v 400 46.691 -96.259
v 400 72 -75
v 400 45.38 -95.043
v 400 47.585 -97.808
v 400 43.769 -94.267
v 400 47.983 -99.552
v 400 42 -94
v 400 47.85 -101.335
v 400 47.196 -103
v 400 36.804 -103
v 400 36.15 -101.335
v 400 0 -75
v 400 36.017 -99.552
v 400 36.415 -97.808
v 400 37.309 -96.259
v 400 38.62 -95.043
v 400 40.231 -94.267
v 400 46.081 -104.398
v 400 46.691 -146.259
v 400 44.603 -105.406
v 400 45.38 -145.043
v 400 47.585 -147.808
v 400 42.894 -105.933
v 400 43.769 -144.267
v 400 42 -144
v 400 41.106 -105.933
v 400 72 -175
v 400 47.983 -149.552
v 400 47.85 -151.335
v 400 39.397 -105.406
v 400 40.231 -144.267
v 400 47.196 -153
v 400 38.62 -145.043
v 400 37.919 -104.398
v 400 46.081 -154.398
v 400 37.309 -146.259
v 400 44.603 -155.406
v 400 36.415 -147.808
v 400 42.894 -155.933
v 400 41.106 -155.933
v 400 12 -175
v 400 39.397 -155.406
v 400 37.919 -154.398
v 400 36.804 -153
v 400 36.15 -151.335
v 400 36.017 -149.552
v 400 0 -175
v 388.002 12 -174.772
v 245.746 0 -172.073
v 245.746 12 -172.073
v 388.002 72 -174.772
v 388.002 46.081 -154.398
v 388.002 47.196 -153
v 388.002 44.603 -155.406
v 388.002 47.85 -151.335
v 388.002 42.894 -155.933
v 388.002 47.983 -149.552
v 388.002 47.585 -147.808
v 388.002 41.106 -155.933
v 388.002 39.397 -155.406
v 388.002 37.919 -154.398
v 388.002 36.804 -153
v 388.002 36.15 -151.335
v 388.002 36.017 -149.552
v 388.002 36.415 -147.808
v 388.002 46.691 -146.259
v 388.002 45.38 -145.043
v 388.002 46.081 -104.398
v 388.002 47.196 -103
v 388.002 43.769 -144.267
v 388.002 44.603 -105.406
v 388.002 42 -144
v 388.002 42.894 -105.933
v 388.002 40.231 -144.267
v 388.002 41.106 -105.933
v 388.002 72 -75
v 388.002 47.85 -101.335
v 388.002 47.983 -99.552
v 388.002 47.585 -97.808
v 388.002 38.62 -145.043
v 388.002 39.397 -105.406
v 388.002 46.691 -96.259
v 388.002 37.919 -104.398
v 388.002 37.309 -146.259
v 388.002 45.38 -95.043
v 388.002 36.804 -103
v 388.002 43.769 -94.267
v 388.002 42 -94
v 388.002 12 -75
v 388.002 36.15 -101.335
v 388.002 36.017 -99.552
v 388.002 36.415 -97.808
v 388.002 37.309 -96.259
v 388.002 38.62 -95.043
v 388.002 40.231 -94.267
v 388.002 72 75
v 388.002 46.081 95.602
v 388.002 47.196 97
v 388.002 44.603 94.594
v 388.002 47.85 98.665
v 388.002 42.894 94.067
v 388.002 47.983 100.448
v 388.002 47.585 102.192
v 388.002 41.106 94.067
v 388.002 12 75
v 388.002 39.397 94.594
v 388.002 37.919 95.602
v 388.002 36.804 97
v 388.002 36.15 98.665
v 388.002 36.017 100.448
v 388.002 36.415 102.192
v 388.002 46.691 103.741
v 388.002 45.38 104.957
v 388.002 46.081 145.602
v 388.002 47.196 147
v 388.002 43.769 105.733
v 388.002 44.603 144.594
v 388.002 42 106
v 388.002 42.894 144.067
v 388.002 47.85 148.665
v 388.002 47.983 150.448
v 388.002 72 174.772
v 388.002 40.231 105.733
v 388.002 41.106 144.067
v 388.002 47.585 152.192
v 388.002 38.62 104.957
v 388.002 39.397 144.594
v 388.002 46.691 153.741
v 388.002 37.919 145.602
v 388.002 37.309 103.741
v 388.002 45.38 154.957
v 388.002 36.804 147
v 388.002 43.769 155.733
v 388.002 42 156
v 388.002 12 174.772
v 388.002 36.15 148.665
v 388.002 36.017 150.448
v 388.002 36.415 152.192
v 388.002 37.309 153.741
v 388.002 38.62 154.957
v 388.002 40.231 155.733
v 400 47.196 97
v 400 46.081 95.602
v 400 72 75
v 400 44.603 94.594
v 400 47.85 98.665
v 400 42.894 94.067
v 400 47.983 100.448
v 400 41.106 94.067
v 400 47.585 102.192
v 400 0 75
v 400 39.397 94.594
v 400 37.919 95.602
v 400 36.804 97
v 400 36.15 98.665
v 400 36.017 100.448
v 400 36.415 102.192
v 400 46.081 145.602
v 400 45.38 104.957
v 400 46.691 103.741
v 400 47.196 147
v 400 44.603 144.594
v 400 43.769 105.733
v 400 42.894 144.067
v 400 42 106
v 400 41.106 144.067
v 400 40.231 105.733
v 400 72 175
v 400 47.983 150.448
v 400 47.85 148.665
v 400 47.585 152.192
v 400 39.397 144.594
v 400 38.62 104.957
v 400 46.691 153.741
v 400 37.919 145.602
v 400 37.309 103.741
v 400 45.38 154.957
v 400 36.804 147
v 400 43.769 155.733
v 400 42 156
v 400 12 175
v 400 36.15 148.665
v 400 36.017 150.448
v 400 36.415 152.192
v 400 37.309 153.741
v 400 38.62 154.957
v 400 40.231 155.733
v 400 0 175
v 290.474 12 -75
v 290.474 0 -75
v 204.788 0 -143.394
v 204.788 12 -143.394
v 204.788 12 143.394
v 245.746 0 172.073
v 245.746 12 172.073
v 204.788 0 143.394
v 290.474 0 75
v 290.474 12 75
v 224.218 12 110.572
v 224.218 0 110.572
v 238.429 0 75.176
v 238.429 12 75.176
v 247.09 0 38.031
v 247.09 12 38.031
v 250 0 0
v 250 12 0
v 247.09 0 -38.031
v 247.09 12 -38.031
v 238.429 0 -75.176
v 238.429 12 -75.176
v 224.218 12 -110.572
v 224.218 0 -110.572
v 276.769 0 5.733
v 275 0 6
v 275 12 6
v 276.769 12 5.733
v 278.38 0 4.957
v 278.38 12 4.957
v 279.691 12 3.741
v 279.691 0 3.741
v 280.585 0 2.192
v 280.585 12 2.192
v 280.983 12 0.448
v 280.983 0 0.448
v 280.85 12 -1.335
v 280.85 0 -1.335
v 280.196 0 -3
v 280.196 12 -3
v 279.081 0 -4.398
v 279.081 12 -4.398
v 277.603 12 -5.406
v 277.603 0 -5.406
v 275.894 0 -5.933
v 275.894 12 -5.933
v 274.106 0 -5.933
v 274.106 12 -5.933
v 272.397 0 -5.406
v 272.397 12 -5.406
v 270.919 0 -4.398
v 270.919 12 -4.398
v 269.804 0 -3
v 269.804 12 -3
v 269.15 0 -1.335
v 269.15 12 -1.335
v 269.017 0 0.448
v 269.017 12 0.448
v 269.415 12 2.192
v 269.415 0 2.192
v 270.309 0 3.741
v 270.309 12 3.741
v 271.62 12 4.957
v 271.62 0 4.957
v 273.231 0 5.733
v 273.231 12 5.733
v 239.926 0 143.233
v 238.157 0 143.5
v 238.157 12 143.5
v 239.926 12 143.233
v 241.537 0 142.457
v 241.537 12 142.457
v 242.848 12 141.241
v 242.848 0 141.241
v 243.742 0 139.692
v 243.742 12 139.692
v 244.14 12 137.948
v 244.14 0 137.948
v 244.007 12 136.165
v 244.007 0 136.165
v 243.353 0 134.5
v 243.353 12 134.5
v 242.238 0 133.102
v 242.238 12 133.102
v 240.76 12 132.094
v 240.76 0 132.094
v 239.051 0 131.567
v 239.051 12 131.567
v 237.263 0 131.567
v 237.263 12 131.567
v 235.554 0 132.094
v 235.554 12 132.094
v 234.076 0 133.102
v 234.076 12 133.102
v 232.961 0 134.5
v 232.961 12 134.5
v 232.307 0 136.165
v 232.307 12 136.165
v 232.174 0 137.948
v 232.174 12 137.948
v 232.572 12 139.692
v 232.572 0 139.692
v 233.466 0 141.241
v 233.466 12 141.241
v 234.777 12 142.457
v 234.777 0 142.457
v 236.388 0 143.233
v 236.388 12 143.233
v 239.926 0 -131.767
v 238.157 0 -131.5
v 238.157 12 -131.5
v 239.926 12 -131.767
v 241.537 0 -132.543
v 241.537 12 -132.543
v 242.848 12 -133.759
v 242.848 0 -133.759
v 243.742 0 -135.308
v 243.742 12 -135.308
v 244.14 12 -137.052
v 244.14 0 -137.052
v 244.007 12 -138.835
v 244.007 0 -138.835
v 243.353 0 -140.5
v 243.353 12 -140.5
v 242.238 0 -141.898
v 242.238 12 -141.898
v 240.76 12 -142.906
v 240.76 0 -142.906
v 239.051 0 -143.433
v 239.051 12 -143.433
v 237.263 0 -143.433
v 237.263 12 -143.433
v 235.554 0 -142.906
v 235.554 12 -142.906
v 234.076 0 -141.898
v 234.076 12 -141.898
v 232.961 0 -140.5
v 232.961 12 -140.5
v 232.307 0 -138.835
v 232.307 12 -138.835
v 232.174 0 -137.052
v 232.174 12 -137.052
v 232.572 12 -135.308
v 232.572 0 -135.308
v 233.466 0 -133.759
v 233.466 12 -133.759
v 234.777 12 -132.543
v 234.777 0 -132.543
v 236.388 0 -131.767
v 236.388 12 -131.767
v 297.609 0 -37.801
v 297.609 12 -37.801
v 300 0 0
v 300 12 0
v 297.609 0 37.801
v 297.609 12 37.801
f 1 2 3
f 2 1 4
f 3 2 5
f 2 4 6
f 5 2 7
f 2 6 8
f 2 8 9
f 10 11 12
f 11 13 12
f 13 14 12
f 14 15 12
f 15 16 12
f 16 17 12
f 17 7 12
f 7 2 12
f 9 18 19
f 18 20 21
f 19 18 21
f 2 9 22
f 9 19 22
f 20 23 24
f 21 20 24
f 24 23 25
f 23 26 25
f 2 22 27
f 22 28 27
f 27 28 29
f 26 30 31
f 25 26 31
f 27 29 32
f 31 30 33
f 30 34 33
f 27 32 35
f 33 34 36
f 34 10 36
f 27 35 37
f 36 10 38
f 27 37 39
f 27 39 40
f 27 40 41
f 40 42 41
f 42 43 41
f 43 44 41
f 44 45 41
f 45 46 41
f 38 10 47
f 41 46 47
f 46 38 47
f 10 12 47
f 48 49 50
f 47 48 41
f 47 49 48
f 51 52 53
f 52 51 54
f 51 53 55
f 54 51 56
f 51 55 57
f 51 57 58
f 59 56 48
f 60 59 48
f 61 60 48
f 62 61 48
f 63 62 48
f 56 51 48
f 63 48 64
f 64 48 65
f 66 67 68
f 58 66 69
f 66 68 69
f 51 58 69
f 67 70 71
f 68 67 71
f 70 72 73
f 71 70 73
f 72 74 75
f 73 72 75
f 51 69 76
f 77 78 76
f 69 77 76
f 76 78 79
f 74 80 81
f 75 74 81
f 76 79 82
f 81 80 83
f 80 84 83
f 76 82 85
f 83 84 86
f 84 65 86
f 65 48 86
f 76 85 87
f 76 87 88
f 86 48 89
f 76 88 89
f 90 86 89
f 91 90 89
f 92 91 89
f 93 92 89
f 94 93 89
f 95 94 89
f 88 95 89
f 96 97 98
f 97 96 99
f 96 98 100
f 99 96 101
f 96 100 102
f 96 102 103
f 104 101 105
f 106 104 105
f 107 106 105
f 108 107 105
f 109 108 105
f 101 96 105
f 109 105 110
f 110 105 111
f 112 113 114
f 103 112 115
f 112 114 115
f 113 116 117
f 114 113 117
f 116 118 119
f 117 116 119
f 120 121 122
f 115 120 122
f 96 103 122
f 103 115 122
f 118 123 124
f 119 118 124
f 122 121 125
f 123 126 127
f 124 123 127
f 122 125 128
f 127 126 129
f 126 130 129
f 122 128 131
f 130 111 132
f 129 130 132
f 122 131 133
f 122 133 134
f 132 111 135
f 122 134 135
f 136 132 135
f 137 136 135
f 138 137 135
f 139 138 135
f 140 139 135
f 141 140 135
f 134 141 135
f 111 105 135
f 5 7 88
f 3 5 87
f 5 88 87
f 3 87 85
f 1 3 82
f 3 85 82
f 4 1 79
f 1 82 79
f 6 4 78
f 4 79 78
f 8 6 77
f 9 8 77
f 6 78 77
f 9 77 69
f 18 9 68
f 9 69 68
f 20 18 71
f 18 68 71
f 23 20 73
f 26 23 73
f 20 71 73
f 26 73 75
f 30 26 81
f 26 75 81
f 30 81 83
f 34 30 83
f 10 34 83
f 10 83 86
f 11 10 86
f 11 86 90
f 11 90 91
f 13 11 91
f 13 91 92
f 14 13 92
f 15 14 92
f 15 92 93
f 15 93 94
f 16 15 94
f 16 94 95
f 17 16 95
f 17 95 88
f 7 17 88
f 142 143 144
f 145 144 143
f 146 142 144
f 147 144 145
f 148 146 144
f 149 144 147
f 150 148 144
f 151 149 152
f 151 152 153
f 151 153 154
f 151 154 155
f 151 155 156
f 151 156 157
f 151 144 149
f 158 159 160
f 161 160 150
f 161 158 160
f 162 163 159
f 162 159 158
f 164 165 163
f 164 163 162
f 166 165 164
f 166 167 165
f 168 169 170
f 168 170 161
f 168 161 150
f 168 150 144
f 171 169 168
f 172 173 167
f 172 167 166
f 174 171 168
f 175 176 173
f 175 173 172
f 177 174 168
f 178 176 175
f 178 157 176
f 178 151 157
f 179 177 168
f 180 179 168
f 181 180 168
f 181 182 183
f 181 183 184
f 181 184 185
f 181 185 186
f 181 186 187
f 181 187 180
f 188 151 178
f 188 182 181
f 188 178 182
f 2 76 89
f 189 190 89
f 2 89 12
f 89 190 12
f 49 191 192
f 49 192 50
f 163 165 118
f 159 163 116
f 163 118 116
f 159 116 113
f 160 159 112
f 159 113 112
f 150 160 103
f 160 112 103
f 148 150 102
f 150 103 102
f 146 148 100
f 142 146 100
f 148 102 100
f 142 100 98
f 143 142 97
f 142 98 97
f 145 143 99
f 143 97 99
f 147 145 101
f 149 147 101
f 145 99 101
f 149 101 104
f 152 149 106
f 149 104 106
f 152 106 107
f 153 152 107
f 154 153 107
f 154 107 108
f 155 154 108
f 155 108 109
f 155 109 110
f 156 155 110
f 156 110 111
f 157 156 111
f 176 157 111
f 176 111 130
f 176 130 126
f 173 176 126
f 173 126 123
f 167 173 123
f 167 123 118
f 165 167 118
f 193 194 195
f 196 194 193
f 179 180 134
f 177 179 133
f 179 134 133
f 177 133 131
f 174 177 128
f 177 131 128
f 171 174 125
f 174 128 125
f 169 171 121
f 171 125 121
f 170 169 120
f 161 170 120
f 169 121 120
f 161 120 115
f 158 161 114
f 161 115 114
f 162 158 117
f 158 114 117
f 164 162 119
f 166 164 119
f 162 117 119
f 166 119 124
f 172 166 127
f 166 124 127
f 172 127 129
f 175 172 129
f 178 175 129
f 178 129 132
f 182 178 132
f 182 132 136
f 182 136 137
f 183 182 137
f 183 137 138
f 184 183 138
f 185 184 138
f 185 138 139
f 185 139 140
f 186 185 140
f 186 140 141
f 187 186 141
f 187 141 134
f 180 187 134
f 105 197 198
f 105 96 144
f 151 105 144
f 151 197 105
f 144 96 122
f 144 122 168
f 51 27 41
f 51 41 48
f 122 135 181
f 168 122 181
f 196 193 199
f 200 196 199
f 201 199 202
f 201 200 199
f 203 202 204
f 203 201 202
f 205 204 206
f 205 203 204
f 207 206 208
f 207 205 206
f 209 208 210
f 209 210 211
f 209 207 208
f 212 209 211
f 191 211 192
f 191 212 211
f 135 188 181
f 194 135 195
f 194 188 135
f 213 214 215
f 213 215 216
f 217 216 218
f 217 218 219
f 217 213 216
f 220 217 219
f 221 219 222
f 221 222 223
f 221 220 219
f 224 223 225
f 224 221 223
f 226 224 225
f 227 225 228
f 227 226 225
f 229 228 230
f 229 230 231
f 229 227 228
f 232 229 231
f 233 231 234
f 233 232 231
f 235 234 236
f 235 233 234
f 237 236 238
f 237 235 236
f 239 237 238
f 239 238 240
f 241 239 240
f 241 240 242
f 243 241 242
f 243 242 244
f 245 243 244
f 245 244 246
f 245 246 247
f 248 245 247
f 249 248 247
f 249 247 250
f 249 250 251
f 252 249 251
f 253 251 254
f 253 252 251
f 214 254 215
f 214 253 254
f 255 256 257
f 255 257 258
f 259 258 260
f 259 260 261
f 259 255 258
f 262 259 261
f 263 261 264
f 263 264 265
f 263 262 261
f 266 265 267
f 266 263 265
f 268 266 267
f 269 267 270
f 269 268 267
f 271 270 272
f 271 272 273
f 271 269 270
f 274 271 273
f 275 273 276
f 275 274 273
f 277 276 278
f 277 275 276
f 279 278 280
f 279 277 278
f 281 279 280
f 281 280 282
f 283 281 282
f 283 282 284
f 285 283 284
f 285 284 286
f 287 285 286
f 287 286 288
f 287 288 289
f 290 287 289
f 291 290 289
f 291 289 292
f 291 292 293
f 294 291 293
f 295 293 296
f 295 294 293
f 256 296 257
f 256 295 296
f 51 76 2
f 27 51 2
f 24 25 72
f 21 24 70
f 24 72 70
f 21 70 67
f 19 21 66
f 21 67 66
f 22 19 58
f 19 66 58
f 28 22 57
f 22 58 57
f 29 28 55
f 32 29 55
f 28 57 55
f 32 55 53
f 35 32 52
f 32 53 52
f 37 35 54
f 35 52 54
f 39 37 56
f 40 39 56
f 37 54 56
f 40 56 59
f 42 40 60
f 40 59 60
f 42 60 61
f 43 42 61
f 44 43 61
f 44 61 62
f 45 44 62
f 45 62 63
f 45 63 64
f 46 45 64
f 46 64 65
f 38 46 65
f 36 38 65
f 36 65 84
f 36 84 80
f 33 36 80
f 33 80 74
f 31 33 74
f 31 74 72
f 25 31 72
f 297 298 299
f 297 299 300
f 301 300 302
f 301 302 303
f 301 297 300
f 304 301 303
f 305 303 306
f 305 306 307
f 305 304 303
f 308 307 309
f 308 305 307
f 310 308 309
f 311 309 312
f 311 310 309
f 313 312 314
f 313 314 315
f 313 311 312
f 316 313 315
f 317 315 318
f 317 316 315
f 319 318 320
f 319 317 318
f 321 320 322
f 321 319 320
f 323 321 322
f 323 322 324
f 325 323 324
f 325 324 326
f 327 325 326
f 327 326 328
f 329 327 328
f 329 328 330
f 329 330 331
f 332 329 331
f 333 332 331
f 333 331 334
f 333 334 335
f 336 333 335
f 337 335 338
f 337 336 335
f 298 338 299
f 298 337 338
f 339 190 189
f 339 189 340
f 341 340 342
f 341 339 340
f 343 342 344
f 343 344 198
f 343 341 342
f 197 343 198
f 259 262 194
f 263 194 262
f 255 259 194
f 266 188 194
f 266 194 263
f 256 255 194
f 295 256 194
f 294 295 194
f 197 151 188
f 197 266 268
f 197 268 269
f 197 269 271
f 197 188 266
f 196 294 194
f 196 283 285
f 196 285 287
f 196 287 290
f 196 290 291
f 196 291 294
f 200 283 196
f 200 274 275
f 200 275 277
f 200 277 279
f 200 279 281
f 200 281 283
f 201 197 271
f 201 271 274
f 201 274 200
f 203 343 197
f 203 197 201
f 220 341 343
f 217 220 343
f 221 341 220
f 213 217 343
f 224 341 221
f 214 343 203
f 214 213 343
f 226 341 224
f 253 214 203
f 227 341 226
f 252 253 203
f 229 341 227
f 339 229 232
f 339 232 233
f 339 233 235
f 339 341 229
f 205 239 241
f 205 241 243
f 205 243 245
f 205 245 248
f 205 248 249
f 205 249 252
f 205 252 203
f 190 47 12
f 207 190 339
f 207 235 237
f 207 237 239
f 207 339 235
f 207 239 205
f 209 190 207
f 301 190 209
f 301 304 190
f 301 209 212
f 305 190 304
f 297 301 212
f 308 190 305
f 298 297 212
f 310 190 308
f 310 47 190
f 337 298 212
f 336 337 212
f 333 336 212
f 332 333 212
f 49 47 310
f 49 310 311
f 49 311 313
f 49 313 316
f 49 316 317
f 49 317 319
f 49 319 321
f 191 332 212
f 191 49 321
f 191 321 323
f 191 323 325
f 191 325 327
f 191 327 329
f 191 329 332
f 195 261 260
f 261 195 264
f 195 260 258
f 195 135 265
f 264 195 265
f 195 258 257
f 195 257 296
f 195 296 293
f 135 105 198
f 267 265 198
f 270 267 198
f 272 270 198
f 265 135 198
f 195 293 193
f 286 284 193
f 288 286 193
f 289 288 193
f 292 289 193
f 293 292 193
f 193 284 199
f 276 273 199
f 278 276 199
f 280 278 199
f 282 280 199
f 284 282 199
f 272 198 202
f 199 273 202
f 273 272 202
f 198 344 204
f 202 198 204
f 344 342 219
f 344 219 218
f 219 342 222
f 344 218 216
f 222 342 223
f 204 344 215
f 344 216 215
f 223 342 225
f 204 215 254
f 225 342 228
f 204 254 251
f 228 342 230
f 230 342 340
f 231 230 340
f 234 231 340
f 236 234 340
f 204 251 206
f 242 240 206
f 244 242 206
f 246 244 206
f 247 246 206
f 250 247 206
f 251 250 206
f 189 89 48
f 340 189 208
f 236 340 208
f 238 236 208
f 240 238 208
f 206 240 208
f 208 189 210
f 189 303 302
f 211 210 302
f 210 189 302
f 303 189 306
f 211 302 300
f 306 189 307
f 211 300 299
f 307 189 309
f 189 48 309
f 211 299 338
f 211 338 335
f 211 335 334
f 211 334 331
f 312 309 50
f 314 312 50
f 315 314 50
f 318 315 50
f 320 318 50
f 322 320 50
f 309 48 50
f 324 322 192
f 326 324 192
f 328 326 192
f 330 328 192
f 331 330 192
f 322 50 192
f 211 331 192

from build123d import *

# Parameters (mm, degrees)
SKETCH1_R           = 6
BOSS_EXTRUDE2_DEPTH = 12
BOSS_EXTRUDE3_DEPTH = 60
SKETCH3_R           = 6
CUT_EXTRUDE1_DEPTH  = 264.394047607


with BuildPart() as part:
    # Sketch1 → Boss-Extrude2 (new body)
    with BuildSketch(Plane(origin=(0, 0, 0), x_dir=(1, 0, 0), z_dir=(0, 1, 0))):
        with BuildLine():
            Line((400, 175), (400, 75))
            Line((400, 75), (290.473750966, 75))
            ThreePointArc((290.473750966, 75), (300, 0), (290.473750966, -75))
            Line((290.473750966, -75), (400, -75))
            Line((400, -75), (400, -175))
            Line((400, -175), (245.745613287, -172.072930905))
            Line((245.745613287, -172.072930905), (204.788011072, -143.394109088))
            ThreePointArc((204.788011072, -143.394109088), (250, 0), (204.788011072, 143.394109088))
            Line((204.788011072, 143.394109088), (245.745613287, 172.072930905))
            Line((245.745613287, 172.072930905), (400, 175))
        make_face()
        with Locations(Location((238.156986041, -137.5, 0), (0, 0, 270))):
            Circle(SKETCH1_R, mode=Mode.SUBTRACT)
        with Locations(Location((275, 0, 0), (0, 0, 270))):
            Circle(SKETCH1_R, mode=Mode.SUBTRACT)
        with Locations(Location((238.156986041, 137.5, 0), (0, 0, 270))):
            Circle(SKETCH1_R, mode=Mode.SUBTRACT)
    extrude(amount=BOSS_EXTRUDE2_DEPTH)

    # Sketch2 → Boss-Extrude3 (add)
    with BuildSketch(Plane(origin=(0, 12, 0), x_dir=(1, 0, 0), z_dir=(0, 1, 0))):
        Polygon((400, 75), (400, 175), (388.002159856, 174.772333819), (388.002159856, 75), align=None)
        Polygon((400, -175), (400, -75), (388.002159856, -75), (388.002159856, -174.772333819), align=None)
    extrude(amount=BOSS_EXTRUDE3_DEPTH)

    # Sketch3 → Cut-Extrude1 (cut, through all)
    with BuildSketch(Plane.ZY.offset(-388.002159856)):
        with Locations((-150, 42)):
            Circle(SKETCH3_R)
        with Locations((-100, 42)):
            Circle(SKETCH3_R)
        with Locations((100, 42)):
            Circle(SKETCH3_R)
        with Locations((150, 42)):
            Circle(SKETCH3_R)
    extrude(amount=-CUT_EXTRUDE1_DEPTH, mode=Mode.SUBTRACT)


solid = part.part
